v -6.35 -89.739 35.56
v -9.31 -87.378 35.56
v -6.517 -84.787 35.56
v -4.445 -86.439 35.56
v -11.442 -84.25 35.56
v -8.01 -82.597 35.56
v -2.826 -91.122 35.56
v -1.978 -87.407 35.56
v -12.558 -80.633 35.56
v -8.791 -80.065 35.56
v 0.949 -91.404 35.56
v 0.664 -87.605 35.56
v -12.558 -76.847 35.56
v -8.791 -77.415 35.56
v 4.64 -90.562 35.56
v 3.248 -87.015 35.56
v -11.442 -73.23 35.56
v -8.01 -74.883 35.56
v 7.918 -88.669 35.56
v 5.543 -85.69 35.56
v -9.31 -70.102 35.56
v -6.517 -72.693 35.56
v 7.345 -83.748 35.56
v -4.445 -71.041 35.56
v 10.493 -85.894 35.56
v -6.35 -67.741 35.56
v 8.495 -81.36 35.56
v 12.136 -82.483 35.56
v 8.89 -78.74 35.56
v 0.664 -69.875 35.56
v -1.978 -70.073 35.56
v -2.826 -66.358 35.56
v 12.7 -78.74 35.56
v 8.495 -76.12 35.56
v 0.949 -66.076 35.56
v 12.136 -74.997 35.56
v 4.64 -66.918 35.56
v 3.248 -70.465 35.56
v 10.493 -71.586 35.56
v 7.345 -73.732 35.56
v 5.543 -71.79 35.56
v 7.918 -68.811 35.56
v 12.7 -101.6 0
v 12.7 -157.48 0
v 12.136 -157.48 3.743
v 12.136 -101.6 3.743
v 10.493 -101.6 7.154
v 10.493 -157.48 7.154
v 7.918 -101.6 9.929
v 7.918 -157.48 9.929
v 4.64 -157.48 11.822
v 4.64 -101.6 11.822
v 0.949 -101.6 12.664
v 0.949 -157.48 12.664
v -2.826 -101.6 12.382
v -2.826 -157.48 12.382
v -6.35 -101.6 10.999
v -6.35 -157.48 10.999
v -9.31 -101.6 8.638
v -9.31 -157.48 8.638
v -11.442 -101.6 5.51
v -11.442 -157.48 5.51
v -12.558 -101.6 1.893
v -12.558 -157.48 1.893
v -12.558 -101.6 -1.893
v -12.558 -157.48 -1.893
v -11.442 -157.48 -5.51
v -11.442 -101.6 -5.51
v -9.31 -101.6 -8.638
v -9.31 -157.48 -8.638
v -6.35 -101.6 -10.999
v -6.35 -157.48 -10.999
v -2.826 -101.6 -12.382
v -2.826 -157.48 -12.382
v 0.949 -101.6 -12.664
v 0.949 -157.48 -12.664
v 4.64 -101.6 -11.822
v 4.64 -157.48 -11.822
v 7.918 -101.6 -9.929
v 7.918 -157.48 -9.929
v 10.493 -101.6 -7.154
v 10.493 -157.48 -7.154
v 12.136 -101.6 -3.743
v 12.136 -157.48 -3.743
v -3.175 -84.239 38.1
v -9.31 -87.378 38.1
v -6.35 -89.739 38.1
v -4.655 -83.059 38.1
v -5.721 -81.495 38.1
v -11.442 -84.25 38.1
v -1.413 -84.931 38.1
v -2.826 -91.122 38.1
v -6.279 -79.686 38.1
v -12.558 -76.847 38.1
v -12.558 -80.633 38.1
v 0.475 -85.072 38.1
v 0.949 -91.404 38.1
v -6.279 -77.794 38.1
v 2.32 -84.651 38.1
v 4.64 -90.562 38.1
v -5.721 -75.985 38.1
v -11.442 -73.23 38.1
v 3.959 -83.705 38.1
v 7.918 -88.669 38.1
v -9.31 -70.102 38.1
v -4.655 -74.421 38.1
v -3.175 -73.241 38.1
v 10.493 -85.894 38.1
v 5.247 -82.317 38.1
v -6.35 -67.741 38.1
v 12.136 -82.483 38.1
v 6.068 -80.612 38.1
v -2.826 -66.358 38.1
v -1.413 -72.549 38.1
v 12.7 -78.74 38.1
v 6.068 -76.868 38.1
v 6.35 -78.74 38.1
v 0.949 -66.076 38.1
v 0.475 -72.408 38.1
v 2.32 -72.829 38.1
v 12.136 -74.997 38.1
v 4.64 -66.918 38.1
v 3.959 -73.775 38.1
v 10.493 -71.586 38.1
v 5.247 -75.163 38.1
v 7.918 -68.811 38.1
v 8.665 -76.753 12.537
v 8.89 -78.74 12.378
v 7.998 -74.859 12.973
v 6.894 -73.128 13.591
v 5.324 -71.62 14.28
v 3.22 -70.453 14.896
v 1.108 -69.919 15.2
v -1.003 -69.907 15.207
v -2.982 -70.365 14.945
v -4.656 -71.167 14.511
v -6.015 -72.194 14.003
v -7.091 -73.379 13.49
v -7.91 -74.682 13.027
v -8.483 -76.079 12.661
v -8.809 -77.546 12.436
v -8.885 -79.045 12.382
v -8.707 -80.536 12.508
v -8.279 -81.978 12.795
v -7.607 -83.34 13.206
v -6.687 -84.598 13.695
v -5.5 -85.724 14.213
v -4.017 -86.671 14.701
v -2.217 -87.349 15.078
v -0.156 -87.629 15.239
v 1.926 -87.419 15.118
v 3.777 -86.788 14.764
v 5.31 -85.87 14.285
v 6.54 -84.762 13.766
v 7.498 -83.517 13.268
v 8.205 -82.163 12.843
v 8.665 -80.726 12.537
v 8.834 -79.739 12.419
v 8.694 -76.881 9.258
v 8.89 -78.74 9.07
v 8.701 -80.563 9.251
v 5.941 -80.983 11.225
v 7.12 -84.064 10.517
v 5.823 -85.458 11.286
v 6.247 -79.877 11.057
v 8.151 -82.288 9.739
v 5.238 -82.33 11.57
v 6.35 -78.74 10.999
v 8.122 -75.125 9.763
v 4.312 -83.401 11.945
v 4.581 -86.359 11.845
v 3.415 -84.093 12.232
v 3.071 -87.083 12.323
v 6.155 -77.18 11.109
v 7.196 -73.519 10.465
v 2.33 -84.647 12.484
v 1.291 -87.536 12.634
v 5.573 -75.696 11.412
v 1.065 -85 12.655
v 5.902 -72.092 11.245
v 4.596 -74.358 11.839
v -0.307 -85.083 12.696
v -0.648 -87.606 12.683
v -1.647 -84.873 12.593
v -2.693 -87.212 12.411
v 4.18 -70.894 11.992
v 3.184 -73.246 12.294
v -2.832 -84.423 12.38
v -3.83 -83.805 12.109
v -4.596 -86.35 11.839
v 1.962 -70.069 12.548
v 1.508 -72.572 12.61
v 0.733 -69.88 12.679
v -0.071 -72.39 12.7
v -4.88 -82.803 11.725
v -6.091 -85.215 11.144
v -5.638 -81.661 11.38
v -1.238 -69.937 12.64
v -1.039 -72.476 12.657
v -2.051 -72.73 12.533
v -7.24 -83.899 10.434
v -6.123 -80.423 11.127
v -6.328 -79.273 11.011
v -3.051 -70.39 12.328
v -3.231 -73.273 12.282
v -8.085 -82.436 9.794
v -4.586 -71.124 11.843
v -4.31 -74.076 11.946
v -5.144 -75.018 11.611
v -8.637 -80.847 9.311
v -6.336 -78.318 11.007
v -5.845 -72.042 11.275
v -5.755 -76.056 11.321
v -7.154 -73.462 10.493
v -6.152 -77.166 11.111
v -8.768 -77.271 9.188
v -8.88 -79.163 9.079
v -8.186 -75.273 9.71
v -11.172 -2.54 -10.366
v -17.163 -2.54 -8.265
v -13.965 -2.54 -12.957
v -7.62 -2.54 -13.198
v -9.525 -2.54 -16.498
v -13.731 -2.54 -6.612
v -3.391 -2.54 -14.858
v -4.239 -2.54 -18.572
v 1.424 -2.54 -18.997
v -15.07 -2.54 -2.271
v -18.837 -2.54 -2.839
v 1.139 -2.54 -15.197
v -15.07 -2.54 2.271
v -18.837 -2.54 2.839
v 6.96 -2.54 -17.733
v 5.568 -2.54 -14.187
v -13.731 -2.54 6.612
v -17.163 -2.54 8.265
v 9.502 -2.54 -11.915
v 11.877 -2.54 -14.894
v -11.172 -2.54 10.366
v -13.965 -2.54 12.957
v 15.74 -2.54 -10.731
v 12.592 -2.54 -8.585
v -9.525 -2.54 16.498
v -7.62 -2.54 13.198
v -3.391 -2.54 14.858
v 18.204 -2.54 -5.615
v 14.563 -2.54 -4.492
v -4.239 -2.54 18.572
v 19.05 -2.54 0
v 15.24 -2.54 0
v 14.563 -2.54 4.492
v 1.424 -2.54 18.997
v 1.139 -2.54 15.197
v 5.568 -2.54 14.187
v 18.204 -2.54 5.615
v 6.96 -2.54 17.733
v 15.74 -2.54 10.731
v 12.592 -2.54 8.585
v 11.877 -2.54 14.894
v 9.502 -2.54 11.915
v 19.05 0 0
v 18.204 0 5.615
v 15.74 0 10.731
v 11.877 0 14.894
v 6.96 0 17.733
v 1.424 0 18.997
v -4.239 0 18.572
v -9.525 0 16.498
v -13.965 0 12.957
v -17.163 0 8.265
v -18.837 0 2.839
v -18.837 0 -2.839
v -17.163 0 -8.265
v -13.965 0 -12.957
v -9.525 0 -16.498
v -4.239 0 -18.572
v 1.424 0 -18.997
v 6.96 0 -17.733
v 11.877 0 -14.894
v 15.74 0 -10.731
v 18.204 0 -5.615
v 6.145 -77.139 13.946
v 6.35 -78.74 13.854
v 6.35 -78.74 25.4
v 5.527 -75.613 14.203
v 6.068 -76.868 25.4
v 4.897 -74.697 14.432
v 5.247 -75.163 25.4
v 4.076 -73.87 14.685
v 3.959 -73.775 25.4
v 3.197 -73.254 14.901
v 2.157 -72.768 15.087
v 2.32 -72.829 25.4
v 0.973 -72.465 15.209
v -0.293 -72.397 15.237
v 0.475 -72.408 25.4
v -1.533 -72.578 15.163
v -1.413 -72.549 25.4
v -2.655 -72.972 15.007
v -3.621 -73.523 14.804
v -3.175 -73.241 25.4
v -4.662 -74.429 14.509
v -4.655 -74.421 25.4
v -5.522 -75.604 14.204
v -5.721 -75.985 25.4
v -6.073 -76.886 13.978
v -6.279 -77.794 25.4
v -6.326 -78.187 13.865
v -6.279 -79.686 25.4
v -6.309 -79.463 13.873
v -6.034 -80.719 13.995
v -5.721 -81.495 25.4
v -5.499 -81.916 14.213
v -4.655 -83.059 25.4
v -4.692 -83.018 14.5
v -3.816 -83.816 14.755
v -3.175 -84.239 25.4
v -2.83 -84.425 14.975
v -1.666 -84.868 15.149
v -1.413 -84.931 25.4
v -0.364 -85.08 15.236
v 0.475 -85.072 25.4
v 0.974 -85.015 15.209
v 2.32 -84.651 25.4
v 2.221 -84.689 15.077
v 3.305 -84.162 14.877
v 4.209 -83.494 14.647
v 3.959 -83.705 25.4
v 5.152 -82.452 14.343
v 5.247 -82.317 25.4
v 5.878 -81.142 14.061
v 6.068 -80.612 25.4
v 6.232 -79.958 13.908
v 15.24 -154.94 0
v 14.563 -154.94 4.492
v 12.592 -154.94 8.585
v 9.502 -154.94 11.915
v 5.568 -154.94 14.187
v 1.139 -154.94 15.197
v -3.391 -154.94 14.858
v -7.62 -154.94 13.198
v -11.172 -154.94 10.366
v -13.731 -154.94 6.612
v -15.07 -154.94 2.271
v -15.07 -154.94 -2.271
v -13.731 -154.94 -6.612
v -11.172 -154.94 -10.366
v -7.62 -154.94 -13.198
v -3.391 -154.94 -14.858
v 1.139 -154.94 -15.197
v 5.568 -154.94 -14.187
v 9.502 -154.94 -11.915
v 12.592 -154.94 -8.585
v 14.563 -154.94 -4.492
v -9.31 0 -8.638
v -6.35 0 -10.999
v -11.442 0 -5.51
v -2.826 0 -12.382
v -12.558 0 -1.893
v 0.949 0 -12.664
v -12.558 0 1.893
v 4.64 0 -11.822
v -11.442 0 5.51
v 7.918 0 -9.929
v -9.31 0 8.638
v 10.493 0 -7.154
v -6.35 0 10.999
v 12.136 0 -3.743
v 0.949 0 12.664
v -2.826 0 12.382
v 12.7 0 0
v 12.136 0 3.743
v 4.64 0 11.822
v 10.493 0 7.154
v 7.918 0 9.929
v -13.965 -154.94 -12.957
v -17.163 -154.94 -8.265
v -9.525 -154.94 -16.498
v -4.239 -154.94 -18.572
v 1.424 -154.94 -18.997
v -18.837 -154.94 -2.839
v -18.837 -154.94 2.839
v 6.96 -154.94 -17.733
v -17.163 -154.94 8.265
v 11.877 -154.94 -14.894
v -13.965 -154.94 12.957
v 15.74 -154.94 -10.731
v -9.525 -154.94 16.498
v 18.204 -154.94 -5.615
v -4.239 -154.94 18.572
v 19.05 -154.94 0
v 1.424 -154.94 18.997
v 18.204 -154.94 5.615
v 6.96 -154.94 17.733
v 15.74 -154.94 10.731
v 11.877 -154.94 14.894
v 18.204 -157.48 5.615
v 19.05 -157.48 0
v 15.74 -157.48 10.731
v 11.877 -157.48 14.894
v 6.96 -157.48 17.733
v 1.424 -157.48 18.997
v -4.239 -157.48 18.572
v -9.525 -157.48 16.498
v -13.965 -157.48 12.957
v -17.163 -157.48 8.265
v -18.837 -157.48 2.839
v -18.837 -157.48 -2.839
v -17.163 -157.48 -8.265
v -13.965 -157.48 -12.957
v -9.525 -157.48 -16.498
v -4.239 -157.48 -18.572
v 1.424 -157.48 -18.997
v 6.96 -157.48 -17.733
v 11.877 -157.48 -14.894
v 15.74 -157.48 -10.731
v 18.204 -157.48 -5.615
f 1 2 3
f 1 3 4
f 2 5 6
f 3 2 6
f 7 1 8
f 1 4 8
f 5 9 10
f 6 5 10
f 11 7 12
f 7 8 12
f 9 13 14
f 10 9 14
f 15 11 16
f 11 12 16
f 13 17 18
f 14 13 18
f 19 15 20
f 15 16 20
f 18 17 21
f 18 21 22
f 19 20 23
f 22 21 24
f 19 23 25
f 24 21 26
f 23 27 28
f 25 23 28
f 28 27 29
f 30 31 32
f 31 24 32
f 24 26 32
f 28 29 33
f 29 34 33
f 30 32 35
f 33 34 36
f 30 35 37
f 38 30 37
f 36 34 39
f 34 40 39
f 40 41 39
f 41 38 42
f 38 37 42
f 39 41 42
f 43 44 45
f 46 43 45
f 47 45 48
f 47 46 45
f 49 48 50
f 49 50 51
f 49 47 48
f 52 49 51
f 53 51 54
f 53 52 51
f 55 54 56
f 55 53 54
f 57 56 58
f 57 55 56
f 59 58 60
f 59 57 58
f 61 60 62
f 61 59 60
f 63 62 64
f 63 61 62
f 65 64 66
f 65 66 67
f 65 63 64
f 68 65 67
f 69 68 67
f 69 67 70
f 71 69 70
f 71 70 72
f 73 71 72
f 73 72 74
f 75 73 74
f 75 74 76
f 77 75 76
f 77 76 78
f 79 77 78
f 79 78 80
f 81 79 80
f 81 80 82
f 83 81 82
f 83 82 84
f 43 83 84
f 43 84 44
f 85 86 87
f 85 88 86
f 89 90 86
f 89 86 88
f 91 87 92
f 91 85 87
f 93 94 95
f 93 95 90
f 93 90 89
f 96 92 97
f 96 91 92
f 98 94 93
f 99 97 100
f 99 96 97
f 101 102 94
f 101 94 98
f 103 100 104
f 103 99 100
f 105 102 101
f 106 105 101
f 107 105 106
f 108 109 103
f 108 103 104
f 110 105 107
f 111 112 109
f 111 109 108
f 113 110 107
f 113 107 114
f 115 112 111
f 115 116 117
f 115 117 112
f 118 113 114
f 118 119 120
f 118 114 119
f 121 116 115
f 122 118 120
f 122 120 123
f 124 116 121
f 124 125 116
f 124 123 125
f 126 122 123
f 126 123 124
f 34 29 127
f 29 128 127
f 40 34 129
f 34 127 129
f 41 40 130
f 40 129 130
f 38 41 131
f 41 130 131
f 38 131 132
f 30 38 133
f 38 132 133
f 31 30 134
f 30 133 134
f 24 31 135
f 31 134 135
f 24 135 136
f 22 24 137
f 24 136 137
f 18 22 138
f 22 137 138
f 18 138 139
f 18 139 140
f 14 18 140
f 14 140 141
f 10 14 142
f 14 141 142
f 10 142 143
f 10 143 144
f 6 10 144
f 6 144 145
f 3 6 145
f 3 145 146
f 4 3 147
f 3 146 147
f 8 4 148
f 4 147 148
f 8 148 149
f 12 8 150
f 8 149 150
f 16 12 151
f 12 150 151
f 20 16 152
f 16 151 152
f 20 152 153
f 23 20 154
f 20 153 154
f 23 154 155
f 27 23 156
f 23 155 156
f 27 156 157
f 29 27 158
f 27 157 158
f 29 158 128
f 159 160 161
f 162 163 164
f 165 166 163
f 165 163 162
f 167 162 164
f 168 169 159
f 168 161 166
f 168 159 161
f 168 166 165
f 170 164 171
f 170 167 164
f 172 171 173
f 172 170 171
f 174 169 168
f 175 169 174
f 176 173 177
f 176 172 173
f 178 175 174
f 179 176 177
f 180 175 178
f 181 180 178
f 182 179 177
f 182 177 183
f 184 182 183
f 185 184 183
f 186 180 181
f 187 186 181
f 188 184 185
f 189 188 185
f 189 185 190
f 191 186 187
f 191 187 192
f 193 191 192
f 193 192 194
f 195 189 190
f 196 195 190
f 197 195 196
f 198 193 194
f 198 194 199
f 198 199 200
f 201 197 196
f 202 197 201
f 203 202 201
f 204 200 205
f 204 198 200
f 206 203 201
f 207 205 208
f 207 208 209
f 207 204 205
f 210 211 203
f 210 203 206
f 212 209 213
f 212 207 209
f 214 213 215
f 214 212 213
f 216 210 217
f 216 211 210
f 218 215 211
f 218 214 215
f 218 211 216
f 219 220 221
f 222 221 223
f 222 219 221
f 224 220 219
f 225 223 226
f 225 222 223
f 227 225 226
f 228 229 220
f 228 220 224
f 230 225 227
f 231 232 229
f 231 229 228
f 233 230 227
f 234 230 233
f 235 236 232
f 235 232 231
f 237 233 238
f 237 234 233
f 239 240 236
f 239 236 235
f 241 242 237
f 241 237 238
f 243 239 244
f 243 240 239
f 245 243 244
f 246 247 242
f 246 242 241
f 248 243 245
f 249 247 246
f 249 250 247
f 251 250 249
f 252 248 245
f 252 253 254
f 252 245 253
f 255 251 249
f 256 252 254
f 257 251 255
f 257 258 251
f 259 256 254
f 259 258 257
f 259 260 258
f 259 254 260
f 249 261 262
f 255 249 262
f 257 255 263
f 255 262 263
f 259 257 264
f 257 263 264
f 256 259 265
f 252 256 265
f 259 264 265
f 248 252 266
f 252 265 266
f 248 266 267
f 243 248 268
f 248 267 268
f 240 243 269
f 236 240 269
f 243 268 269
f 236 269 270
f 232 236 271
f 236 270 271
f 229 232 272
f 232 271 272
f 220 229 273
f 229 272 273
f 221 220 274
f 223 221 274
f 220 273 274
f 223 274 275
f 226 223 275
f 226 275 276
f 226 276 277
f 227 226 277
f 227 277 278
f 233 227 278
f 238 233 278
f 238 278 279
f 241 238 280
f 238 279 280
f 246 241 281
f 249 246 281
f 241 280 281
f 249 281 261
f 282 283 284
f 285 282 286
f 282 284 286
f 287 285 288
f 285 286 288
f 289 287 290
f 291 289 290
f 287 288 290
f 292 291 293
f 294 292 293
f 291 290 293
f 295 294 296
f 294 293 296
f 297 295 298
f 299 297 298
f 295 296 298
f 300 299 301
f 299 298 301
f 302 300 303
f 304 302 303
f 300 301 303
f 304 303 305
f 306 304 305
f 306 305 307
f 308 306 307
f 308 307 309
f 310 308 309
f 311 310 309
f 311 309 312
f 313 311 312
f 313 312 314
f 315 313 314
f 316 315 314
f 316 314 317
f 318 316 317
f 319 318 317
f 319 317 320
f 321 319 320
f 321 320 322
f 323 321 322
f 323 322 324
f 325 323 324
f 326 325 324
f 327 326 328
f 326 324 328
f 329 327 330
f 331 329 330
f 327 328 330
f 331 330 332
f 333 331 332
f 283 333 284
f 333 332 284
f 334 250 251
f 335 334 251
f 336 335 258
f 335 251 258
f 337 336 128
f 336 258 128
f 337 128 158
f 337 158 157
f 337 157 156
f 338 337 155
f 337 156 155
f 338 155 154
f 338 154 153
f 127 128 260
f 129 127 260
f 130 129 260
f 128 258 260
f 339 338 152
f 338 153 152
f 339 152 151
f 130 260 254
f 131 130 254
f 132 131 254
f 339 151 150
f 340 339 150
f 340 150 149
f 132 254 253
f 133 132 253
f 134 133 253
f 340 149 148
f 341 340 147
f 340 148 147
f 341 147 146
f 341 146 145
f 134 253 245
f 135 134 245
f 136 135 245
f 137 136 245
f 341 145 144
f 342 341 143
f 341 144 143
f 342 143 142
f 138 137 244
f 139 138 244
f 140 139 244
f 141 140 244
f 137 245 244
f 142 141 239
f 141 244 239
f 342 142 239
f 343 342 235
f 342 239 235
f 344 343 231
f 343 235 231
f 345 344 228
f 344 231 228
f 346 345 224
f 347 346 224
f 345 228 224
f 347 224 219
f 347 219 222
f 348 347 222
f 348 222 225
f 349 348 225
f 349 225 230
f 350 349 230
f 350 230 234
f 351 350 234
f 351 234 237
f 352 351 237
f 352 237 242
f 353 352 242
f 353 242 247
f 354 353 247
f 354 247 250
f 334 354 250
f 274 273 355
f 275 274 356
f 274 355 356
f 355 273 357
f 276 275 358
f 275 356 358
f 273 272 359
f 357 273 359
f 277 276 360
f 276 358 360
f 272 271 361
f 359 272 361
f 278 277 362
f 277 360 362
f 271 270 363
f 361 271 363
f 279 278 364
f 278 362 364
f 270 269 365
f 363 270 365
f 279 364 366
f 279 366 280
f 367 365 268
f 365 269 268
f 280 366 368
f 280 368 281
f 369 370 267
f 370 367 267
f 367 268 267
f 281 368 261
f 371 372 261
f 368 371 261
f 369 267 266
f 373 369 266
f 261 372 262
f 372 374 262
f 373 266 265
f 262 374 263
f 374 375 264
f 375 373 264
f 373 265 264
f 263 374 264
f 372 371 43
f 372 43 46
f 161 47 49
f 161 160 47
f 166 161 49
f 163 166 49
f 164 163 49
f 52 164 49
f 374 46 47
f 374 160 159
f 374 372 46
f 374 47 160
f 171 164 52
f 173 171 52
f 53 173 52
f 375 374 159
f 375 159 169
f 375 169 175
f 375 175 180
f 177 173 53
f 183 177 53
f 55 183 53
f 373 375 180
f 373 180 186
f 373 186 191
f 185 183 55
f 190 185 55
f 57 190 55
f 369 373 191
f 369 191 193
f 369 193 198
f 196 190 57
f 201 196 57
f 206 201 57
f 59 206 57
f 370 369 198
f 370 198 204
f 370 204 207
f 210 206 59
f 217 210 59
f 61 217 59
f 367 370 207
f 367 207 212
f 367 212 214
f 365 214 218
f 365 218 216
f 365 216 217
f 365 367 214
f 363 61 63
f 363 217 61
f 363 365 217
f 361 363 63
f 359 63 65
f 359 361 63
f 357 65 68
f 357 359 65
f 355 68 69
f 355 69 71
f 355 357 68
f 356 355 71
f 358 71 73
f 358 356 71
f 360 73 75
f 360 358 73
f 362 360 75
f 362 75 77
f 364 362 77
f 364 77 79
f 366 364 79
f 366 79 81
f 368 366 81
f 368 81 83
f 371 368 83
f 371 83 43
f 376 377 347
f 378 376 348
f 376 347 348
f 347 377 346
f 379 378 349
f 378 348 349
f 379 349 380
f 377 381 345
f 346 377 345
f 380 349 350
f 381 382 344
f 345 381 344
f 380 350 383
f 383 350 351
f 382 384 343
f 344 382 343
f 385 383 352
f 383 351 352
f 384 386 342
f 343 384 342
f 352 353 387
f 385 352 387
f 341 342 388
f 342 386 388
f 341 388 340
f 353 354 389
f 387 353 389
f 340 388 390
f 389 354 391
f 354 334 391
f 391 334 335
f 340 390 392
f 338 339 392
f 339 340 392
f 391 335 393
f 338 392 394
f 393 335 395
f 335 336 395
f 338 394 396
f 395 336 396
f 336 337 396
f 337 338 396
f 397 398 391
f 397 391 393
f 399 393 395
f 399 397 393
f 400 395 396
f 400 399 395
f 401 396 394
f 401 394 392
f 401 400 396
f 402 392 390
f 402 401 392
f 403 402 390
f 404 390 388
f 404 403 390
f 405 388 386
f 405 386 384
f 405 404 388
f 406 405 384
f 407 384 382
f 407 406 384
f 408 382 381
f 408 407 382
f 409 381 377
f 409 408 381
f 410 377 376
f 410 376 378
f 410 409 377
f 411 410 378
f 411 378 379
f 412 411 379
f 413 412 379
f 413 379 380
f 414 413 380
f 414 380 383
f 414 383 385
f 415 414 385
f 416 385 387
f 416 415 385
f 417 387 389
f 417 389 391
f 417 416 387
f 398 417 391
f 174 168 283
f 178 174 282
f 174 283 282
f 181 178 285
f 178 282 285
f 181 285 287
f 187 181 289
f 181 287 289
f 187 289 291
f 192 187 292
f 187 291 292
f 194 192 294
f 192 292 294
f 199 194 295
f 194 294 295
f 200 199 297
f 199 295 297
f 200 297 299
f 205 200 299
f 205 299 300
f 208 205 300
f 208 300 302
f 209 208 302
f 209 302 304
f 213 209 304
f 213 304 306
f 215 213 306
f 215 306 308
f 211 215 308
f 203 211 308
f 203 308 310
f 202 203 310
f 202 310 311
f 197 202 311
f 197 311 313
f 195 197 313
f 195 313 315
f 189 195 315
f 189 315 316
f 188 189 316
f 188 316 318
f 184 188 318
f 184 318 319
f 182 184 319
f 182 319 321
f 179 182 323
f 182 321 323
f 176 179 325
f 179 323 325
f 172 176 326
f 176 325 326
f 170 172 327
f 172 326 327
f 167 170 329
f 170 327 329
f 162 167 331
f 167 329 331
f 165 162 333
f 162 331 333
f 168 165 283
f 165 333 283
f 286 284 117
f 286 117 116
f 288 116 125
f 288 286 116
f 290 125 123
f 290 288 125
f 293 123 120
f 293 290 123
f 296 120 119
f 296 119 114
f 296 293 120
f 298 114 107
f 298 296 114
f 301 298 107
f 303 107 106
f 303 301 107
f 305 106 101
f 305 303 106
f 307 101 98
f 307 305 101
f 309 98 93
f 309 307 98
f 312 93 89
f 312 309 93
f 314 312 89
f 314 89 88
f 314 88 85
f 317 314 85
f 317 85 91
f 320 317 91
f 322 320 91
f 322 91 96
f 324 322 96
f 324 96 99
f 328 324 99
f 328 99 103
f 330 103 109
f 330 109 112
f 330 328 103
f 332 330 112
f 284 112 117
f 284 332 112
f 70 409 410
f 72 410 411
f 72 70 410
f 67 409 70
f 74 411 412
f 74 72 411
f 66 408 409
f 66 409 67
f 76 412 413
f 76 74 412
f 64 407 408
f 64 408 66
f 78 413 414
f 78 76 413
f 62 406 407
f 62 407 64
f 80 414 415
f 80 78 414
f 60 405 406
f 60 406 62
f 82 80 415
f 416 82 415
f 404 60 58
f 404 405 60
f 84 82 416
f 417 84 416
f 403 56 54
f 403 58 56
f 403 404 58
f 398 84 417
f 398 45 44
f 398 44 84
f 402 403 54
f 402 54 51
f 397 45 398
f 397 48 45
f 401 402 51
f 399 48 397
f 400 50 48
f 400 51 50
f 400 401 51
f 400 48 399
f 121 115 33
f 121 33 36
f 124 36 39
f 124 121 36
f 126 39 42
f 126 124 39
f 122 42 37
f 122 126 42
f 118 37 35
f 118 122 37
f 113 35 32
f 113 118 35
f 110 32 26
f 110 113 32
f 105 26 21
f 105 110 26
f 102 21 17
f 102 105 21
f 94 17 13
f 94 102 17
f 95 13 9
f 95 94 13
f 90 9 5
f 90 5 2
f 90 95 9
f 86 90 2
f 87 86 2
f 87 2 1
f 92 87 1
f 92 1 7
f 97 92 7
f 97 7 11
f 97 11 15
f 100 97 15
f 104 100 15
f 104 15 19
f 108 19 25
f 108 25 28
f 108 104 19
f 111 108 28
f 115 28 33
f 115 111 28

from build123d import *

# Parameters (mm, degrees)
F0_R          = 15.24
F0_R_2        = 12.7
F1_DEPTH      = 157.48
F0_R_3        = 19.05
F2_DEPTH      = 2.54
F3_R          = 19.05
F3_R_2        = 15.24
F4_DEPTH      = 2.54
F6_R          = 8.89
F6_R_2        = 6.35
F7_DEPTH      = 25.4
F7_DEPTH_BACK = 12.7
F8_R          = 12.7
F8_R_2        = 8.89
F9_DEPTH      = 2.54
F10_DEPTH     = 101.6
F8_R_3        = 6.35
F11_DEPTH     = 38.1


with BuildPart() as f1:
    # F0 (on Front) → F1 (new body)
    with BuildSketch(Plane.XZ):
        Circle(F0_R)
        Circle(F0_R_2, mode=Mode.SUBTRACT)
    extrude(amount=F1_DEPTH)

    # F0 (on Front) → F2 (join)
    with BuildSketch(Plane.XZ):
        Circle(F0_R_3)
        Circle(F0_R, mode=Mode.SUBTRACT)
    extrude(amount=F2_DEPTH)

    # F3 (on face) → F4 (join)
    with BuildSketch(Plane.XZ.offset(157.48)):
        Circle(F3_R)
        Circle(F3_R_2, mode=Mode.SUBTRACT)
    extrude(amount=-F4_DEPTH)

    # F6 (on offset) → F7 (join, two sides)
    with BuildSketch(Plane.XY.offset(25.4)) as f7_sk:
        with Locations((0, -78.74)):
            Circle(F6_R)
        with Locations((0, -78.74)):
            Circle(F6_R_2, mode=Mode.SUBTRACT)
    extrude(amount=-F7_DEPTH)
    extrude(f7_sk.sketch, amount=F7_DEPTH_BACK)

    # F8 (on face) → F9 (join)
    with BuildSketch(Plane.XY.offset(38.1)):
        with Locations((0, -78.74)):
            Circle(F8_R)
        with Locations((0, -78.74)):
            Circle(F8_R_2, mode=Mode.SUBTRACT)
    extrude(amount=-F9_DEPTH)

    # F0 (on Front) → F10 (cut)
    with BuildSketch(Plane.XZ):
        Circle(F0_R_2)
    extrude(amount=F10_DEPTH, mode=Mode.SUBTRACT)

    # F8 (on face) → F11 (cut)
    with BuildSketch(Plane.XY.offset(38.1)):
        with Locations((0, -78.74)):
            Circle(F8_R_3)
    extrude(amount=-F11_DEPTH, mode=Mode.SUBTRACT)


solid = f1.part
